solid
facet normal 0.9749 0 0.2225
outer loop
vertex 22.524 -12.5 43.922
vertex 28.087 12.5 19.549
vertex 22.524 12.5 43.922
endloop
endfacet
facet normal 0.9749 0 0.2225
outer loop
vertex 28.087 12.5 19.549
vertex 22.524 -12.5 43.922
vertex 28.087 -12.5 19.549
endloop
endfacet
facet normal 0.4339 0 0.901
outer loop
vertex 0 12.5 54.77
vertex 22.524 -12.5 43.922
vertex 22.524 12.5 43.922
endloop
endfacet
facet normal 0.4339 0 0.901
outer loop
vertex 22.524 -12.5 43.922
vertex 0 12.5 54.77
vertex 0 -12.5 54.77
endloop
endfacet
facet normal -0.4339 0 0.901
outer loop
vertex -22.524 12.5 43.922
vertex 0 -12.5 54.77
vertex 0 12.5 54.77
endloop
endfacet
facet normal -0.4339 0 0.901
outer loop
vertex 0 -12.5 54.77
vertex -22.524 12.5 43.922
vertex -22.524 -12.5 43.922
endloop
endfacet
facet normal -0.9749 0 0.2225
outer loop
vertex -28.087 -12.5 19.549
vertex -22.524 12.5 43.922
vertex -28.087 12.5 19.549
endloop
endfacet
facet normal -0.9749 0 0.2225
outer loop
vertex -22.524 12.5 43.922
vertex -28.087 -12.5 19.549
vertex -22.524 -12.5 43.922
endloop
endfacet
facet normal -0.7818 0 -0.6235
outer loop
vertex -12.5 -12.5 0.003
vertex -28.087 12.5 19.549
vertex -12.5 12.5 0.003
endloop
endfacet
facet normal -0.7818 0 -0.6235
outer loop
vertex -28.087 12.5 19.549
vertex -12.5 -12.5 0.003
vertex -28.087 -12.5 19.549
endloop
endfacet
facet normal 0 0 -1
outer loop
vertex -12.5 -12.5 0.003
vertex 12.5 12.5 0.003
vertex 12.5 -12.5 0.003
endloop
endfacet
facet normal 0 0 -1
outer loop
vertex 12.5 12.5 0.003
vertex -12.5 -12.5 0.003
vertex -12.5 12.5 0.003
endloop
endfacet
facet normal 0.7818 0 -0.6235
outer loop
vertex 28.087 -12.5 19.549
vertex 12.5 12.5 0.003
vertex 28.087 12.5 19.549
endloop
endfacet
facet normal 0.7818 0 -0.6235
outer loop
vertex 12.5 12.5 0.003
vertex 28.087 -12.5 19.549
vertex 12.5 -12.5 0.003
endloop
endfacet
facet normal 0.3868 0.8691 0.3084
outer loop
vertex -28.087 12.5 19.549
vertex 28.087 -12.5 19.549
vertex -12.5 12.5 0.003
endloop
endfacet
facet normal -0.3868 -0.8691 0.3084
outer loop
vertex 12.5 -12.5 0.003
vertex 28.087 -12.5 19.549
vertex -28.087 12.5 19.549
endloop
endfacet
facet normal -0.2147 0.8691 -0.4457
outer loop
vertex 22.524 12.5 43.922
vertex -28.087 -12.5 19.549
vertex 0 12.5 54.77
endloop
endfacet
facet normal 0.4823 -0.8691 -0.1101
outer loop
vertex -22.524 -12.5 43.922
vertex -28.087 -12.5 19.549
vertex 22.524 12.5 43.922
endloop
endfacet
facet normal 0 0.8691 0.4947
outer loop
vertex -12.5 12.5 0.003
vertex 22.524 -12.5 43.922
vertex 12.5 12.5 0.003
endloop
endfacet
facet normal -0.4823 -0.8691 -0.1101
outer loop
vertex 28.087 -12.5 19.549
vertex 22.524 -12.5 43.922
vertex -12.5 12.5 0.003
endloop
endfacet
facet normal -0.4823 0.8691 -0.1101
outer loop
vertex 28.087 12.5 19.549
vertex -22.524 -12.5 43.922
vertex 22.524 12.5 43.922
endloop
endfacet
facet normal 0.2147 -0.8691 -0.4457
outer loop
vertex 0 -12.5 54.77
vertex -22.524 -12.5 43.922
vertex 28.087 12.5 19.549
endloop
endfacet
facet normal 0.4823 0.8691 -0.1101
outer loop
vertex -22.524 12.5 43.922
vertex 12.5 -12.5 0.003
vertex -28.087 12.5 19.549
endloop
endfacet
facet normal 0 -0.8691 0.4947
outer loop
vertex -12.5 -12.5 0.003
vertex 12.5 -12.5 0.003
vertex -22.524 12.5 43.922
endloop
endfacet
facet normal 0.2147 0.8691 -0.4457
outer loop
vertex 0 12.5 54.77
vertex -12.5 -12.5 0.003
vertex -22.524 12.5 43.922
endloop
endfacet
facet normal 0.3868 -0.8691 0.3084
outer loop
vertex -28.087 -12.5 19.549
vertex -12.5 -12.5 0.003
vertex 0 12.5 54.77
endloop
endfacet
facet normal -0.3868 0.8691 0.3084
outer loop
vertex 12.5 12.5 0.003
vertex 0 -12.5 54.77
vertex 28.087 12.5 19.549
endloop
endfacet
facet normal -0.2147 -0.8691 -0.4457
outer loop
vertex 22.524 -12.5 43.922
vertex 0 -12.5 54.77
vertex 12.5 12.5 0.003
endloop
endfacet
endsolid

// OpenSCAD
/*

A toroidal polyhedra from McCooey's "Visual Polyhedra" site - http://dmccooey.com/polyhedra/ 

This example is a heptagonal iris

-----
http://dmccooey.com/polyhedra/HeptagonalIrisToroid.html

Vertices:
14  (14[5])
Faces:
21  (7 squares + 14 obtuse triangles)
Edges:
35  (21 short + 7 medium + 7 long)
Symmetry:
7-fold Dihedral  (D7)
-----
PCM April, 201
*/





translate([0,0,25.96])
scale(25)
rotate([90,0,0])
polyhedron (iris_cords,Faces);

/*
Heptagonal Iris Toroid

C0 = square-root of a root of the polynomial:  448*(x^3) - 224*(x^2) + 28*x - 1
C1 = square-root of a root of the polynomial:  448*(x^3) - 336*(x^2) + 56*x - 1
C2 = root of the polynomial:  8*(x^3) - 4*(x^2) - 4*x + 1
C3 = square-root of a root of the polynomial:  448*(x^3) - 560*(x^2) + 84*x - 1
C4 = root of the polynomial:  8*(x^3) - 8*(x^2) - 2*x + 1
C5 = square-root of a root of the polynomial:  7*(x^3) - 14*(x^2) + 7*x - 1
*/

pi = 180.;

C0 = 1 / (4 * cos(pi/14));
C1 = (1 + cos(pi/7)) * sqrt(7) / 7;
C2 = cos(pi/7);
C3 = 1/tan(pi/7) / 2;
C4 = 1 / (4 * sin(pi/14));
C5 = 1 / (2 * sin(pi/7));

   iris_cords = [
      [  C4, -C0,  0.5],
      [  C4, -C0, -0.5],
      [ -C4, -C0,  0.5],
      [ -C4, -C0, -0.5],
      [  C2,  C1,  0.5],
      [  C2,  C1, -0.5],
      [ -C2,  C1,  0.5],
      [ -C2,  C1, -0.5],
      [ 0.5, -C3,  0.5],
      [ 0.5, -C3, -0.5],
      [-0.5, -C3,  0.5],
      [-0.5, -C3, -0.5],
      [ 0.0,  C5,  0.5],
      [ 0.0,  C5, -0.5],
      ];

Faces = [
[  0,  4,  5,  1 ],
[  4, 12, 13,  5 ],
[ 12,  6,  7, 13 ],
[  6,  2,  3,  7 ],
[  2, 10, 11,  3 ],
[ 10,  8,  9, 11 ],
[  8,  0,  1,  9 ],
[ 11,  0,  3 ],
[  3,  0,  8 ],
[ 13,  2,  5 ],
[  5,  2,  6 ],
[  9,  4, 11 ],
[ 11,  4,  0 ],
[  5,  6,  1 ],
[  1,  6, 12 ],
[  3,  8,  7 ],
[  7,  8, 10 ],
[  7, 10, 13 ],
[ 13, 10,  2 ],
[  1, 12,  9 ],
[  9, 12,  4 ],
    ];
